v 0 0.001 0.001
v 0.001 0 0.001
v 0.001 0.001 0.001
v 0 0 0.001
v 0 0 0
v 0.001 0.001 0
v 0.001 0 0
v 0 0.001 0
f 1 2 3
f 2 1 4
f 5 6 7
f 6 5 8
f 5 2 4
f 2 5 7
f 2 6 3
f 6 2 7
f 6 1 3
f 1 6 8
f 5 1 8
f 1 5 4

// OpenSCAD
// t_resolution — the library across the resolutions a CONSUMER might set.
//
// Nothing under src/ sets $fa, $fs or $fn, so every one of them comes from the
// calling model. Every other gate pins exactly one resolution per example, so
// until this file existed the library's behaviour across resolutions had never
// been tested at all -- and a resolution-dependent hole through a junction sat
// there rendering `Simple: yes`.

// clang-format off
use <../src/uniTube.scad>;
// clang-format on

// A representative hollow tee, built fresh at each resolution because the
// profiles' point counts depend on it.
function tee() = ut_net(
    [
        ut_run("t", ut_polyline([ [ -50, 0, 0 ], [ 50, 0, 0 ] ]), ut_round(od = 20, wall = 2)),
        ut_run("b", ut_polyline([ [ 0, 10, 0 ], [ 0, 50, 0 ] ]), ut_round(od = 12, wall = 2)),
    ],
    [ut_joint([ [ "t", [ "s", 50 ] ], [ "b", "a" ] ])]);

// --- every analytic check holds across the whole usable range -----------------
for (n = [ 8, 12, 16, 24, 32, 48, 64, 96, 128 ])
{
    assert(ut_check_net(tee(), $fn = n), str("the network must validate at $fn=", n));
}
// And with $fa/$fs instead of $fn, which is the more common way to ask.
for (fa = [ 24, 12, 8, 6, 3, 1 ])
{
    assert(ut_check_net(tee(), $fa = fa, $fs = 0.5), str("the network must validate at $fa=", fa));
}

// --- the bore inradius converges to the nominal from BELOW, never above -------
// This is the property whose absence sized a subtracted sphere too large.
prof = ut_round(od = 20, id = 16, n = 8);
assert(ut_bore_inradius(prof) < 8, "a faceted bore holds a SMALLER sphere than its nominal radius");
assert(ut_bore_inradius(prof) > 0, "but a positive one");
for (n = [ 6, 12, 48 ])
{
    let(p2 = ut_round(od = 20, id = 16, n = n))
    {
        assert(ut_bore_inradius(p2) <= 8 + 1e-9, str("never above nominal, at n=", n));
        assert(ut_bore_inradius(p2) < ut_prof_reach(p2), str("and always inside the outer reach, at n=", n));
    }
}
// Finer sampling must get closer to nominal, never further.
assert(ut_bore_inradius(ut_round(od = 20, id = 16, n = 48)) > ut_bore_inradius(ut_round(od = 20, id = 16, n = 6)),
       "refining the profile must raise the inradius toward the nominal");

// --- the joint ball keeps a real wall across the range ------------------------
// Measured facet to facet. At $fn=5 on a thin-walled tee this goes NEGATIVE,
// which is a hole through the junction -- tests/guards/g_net4_facet_wall.scad.
for (n = [ 12, 24, 64 ])
{
    let(net = tee(), j = ut_net_joints(net)[0])
    {
        assert(ut_sphere_inradius(ut_joint_shell_r(net, j), $fn = n) - ut_joint_core_r(net, j) > 0,
               str("the joint ball must keep material between its facets at $fn=", n));
    }
}

cube(0.001); // sentinel
